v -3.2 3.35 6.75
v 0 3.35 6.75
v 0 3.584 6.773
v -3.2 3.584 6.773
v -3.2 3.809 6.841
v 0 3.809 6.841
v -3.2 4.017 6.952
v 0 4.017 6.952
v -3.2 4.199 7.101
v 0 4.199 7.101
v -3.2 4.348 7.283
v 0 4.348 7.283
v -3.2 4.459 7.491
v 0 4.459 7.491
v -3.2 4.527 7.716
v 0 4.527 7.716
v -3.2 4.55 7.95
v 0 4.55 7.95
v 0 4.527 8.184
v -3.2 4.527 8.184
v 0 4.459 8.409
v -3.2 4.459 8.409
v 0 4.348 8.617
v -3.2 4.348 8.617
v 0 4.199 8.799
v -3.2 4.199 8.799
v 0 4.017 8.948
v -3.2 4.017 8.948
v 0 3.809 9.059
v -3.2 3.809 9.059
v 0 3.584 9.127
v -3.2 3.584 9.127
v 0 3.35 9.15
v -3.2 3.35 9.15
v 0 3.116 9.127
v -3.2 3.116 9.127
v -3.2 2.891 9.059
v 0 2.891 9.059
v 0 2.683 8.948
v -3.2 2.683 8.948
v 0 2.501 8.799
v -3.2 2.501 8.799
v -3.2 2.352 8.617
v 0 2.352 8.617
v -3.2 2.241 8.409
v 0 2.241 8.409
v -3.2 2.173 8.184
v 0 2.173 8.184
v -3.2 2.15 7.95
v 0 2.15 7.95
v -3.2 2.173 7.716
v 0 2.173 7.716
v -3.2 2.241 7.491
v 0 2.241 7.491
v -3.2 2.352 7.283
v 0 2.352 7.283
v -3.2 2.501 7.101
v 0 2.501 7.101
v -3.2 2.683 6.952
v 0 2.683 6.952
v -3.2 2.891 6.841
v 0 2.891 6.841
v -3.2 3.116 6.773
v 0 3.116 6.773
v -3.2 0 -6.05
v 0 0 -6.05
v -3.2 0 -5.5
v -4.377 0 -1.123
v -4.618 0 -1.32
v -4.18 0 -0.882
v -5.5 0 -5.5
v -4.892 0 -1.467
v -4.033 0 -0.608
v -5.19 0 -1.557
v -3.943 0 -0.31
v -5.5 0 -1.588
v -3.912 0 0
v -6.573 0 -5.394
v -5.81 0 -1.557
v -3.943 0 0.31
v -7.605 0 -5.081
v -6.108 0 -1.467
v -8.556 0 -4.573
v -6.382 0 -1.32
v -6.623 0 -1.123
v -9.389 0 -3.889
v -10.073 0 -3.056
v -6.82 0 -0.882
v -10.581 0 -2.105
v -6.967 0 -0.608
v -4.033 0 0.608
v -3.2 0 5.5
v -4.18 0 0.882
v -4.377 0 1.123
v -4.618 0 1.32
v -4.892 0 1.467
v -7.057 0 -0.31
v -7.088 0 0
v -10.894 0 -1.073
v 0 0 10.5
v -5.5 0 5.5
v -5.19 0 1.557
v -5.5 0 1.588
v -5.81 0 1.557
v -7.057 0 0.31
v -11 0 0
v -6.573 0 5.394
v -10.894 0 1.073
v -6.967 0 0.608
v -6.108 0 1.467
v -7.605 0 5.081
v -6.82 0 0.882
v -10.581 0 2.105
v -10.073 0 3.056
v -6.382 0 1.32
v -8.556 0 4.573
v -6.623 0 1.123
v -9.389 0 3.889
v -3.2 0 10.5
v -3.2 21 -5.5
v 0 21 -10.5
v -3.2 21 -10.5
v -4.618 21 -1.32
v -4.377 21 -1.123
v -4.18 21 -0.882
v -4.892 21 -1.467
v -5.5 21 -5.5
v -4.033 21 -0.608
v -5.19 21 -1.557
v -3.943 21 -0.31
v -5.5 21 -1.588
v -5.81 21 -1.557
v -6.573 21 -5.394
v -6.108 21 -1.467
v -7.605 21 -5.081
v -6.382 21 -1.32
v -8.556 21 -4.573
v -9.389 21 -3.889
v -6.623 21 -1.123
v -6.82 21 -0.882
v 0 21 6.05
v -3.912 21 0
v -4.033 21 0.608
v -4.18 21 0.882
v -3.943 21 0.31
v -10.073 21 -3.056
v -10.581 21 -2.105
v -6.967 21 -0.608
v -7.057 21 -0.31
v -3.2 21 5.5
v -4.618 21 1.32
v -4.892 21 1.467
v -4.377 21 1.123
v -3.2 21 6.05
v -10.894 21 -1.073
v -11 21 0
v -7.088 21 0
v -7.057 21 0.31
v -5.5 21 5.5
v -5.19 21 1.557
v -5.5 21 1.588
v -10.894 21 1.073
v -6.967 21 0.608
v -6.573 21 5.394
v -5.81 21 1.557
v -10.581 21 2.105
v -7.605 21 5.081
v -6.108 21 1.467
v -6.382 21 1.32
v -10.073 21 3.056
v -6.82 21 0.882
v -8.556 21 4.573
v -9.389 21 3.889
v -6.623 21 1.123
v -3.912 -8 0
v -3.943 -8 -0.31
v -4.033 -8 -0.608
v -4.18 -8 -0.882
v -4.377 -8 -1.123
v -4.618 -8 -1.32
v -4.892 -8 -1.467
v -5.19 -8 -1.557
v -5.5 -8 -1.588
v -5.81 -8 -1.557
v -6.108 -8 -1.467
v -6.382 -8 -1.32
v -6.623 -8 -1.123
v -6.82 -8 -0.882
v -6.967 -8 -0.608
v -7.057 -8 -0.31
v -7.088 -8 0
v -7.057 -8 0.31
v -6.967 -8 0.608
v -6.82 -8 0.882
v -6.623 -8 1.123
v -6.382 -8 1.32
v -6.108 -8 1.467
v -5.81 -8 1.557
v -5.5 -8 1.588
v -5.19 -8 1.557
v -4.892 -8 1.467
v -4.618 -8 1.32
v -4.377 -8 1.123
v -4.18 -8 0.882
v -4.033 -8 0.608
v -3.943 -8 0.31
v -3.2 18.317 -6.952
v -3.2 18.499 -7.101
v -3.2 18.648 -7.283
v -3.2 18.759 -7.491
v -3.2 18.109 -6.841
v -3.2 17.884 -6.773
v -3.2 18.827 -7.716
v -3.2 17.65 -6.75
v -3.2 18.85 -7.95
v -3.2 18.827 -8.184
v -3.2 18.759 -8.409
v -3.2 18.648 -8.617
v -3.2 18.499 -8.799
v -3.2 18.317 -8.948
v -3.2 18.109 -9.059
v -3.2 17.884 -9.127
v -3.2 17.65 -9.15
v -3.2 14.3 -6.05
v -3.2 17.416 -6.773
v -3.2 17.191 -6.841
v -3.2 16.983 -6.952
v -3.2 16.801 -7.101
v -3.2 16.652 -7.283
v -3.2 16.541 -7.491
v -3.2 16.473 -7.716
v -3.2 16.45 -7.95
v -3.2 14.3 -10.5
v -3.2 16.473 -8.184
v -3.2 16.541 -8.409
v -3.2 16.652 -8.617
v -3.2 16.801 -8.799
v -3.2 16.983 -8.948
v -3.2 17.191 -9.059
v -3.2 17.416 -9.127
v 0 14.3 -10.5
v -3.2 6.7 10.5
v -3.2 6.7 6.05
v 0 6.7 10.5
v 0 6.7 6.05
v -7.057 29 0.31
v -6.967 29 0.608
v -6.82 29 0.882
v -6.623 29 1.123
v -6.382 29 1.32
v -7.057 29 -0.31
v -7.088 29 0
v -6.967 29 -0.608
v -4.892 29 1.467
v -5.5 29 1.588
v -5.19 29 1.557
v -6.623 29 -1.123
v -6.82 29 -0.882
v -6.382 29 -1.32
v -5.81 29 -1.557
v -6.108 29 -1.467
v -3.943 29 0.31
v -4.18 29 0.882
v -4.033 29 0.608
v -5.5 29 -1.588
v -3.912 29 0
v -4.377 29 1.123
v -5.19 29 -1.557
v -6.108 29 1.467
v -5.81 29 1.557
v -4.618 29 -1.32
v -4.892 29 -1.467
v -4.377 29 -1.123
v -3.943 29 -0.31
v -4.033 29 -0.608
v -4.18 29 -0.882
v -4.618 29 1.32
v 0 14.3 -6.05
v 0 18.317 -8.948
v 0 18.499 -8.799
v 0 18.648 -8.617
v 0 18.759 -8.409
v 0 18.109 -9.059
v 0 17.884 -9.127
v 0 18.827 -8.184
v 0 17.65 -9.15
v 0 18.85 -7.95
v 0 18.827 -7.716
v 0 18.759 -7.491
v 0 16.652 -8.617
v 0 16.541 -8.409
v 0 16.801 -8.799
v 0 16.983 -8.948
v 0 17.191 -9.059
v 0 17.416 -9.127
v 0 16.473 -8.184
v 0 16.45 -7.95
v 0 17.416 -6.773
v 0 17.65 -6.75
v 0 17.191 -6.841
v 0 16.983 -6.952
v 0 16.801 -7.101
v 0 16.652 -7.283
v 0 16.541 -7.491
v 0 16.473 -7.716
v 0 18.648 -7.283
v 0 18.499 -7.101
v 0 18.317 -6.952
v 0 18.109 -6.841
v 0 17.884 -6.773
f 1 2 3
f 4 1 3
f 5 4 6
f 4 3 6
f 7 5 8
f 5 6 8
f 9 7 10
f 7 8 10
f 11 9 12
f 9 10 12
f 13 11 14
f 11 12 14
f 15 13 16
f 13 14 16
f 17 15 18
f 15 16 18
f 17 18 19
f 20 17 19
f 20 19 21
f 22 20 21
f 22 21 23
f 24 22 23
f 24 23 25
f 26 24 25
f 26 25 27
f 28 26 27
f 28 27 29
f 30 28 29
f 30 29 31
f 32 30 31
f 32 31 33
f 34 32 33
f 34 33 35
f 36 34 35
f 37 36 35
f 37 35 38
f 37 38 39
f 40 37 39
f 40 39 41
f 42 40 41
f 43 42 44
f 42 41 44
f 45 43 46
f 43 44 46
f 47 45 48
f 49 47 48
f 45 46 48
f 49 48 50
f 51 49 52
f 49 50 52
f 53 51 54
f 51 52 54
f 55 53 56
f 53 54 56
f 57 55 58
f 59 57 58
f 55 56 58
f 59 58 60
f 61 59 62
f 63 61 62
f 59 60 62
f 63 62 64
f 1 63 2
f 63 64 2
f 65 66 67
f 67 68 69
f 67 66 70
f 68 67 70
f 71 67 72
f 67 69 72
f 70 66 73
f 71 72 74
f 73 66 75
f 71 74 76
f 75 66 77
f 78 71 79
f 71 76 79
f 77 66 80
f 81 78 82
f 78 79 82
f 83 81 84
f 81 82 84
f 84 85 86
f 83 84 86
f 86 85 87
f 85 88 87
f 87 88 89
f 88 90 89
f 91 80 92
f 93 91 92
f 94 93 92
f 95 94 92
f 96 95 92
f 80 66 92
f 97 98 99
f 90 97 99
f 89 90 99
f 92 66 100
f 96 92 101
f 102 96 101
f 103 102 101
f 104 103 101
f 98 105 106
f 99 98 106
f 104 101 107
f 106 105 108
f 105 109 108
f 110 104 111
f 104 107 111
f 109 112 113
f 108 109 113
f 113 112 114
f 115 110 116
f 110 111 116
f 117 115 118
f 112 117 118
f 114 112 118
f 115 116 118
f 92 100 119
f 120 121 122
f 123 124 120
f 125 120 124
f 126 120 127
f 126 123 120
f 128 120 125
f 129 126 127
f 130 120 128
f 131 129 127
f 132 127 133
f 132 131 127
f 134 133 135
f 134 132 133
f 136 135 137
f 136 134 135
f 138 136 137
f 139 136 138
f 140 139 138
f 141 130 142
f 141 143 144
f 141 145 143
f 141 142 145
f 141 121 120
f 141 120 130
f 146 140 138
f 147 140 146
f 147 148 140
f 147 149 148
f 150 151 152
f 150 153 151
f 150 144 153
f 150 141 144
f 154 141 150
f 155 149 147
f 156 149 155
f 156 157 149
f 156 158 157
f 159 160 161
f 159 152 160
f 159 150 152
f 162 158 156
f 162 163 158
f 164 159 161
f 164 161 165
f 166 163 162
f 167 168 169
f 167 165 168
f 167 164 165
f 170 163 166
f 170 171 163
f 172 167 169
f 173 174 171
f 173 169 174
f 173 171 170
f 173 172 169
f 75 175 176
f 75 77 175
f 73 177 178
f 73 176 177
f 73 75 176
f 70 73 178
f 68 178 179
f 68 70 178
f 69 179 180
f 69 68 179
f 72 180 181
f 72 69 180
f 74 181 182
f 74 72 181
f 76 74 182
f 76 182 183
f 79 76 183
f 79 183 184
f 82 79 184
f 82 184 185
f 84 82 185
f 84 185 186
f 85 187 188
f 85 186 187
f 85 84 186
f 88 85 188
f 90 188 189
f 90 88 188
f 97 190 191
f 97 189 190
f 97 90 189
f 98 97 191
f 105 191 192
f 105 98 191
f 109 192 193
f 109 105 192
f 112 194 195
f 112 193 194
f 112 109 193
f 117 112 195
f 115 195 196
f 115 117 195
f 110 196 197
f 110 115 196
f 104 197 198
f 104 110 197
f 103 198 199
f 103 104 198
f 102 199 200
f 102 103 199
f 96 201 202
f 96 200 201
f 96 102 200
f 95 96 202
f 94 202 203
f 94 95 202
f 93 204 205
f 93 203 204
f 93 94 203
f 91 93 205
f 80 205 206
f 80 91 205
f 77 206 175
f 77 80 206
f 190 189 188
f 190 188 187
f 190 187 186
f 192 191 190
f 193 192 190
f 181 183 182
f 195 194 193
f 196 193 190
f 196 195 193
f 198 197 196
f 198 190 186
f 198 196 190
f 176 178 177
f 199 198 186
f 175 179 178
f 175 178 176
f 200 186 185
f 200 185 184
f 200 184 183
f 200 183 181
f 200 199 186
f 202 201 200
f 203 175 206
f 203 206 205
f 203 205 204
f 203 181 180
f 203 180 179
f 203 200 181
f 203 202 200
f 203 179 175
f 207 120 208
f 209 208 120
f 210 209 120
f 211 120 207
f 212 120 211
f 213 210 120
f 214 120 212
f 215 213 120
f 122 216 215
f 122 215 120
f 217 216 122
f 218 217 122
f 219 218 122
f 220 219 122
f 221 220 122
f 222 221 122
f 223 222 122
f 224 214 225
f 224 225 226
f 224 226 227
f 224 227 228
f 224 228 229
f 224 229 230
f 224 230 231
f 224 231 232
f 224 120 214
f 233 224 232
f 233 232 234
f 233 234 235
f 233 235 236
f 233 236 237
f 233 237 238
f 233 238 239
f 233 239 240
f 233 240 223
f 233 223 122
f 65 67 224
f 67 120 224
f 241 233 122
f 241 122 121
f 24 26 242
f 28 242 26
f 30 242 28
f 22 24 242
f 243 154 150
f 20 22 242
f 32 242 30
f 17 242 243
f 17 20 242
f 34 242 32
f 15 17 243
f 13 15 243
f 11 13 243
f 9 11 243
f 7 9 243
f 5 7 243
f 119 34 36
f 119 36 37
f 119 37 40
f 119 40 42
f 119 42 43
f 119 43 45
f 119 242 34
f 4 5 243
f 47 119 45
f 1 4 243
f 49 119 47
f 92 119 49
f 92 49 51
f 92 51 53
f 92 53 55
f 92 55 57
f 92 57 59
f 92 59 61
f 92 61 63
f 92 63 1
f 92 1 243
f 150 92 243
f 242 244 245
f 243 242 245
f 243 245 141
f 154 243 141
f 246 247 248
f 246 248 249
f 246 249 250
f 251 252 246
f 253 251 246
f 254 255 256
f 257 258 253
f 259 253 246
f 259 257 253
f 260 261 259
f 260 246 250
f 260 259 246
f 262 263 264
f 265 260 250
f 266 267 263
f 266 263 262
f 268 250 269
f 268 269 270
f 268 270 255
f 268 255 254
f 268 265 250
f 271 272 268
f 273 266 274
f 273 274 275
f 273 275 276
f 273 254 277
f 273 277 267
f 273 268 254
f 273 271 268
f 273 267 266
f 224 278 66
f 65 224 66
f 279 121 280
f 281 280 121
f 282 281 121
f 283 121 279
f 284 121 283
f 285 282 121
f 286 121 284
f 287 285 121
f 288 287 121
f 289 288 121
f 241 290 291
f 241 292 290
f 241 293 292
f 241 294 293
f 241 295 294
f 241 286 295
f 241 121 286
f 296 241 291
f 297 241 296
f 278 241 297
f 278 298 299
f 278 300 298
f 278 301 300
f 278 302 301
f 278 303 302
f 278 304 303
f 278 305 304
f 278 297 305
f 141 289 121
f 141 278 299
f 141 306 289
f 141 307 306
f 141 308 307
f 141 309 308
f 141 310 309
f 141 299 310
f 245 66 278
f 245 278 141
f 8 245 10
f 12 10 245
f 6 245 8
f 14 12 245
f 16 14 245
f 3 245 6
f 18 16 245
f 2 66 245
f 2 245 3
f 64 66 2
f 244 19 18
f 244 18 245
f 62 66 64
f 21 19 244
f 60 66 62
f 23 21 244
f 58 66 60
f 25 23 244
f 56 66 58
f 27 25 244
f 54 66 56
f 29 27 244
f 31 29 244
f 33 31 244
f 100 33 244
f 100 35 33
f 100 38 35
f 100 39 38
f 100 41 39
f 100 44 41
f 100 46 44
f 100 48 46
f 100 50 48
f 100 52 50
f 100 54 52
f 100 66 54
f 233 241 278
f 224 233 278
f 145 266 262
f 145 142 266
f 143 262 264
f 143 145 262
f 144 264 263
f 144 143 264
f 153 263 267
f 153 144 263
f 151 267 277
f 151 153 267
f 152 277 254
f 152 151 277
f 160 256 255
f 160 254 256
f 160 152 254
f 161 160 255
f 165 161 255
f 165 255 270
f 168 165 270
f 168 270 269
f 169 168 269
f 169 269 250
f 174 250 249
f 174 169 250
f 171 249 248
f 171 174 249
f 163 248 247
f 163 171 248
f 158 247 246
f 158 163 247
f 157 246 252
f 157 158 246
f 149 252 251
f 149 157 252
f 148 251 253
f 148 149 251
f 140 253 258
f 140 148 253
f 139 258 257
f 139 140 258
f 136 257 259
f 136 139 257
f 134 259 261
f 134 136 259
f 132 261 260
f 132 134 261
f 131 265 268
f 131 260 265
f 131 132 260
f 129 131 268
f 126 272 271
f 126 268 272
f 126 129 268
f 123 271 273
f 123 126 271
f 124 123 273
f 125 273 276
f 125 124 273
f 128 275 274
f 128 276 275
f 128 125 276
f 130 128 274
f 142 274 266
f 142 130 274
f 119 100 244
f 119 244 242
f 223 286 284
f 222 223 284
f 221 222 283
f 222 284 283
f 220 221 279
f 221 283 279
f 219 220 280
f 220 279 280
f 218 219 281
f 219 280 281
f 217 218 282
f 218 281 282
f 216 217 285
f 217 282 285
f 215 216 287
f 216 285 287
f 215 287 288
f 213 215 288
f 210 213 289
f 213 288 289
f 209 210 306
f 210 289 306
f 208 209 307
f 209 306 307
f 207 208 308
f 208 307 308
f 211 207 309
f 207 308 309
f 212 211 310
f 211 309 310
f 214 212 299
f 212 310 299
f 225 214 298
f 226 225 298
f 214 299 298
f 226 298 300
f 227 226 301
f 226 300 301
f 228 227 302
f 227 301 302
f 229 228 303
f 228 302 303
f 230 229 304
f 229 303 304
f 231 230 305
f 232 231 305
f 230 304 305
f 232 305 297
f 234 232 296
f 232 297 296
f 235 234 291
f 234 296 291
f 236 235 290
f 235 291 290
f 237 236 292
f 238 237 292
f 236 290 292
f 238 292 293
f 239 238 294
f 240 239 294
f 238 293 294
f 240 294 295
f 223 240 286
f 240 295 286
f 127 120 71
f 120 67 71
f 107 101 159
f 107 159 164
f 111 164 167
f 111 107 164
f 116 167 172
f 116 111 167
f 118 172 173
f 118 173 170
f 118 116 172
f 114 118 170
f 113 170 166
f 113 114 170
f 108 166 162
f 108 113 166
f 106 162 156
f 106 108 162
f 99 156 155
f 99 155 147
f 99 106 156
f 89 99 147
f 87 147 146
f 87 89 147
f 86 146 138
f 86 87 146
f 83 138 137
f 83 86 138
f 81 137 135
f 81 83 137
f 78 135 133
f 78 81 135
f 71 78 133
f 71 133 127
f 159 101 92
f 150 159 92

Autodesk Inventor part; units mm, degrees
ref_plane "YZ Plane" through (0, 0, 0) normal (1, 0, 0) x (0, 1, 0)
ref_plane "XZ Plane" through (0, 0, 0) normal (0, 1, 0) x (-1, 0, 0)
ref_plane "XY Plane" through (0, 0, 0) normal (0, 0, 1) x (1, 0, 0)
sketch "Sketch1" plane through (0, 0, 0) normal (0, 1, 0) x (-1, 0, 0)
  arc A0 (5.5, -5.5) -> (11, 0) centre (5.5, 0) ccw
  line L0 (3.2, -5.5) -> (3.2, -10.5)
  line L1 (3.2, -10.5) -> (0, -10.5)
  line L2 (0, -10.5) -> (0, 10.5)
  line L3 (0, 10.5) -> (3.2, 10.5)
  line L4 (3.2, 10.5) -> (3.2, 5.5)
  arc A1 (11, 0) -> (5.5, 5.5) centre (5.5, 0) ccw
  line L5 (3.2, 5.5) -> (11, 0) construction
  line L6 (3.2, -5.5) -> (11, 0) construction
  line L7 (5.5, 5.5) -> (3.2, 5.5)
  line L8 (3.2, -5.5) -> (5.5, -5.5)
  point P0 (0, 0)
  point P1 (0, 0)
  dimension "d0" = 3.2
  dimension "d1" = 21
  dimension "d6" = 11
  dimension "d21" = 11
extrude "Extrusion1" add sketch "Sketch1" along normal blind 21
sketch "Sketch2" plane through (0, 0, 10.5) normal (1, 0, 0) x (0, 0, -1)
  circle A0 centre (18.45, 17.65) radius 1.2
  circle A1 centre (2.55, 3.35) radius 1.2
  line L0 (18.45, 17.65) -> (18.45, 3.35) construction
  line L1 (18.45, 3.35) -> (2.55, 3.35) construction
  line L2 (21, 0) -> (21, 21) projected
  line L3 (0, 0) -> (0, 21) projected
  line L4 (18.45, 17.65) -> (21, 17.65) construction
  line L5 (18.45, 17.65) -> (21, 21) construction
  line L6 (0, 0) -> (2.55, 3.35) construction
  line L7 (2.55, 3.35) -> (0, 3.35) construction
  line L8 (21, 14.3) -> (16.55, 14.3)
  line L9 (16.55, 14.3) -> (16.55, 0)
  line L10 (16.55, 0) -> (21, 0)
  line L11 (0, 6.7) -> (4.45, 6.7)
  line L12 (4.45, 6.7) -> (4.45, 21)
  line L13 (4.45, 21) -> (0, 21)
  line L14 (21, 14.3) -> (18.45, 17.65) construction
  point P0 (10.5, 0)
  dimension "d9" = 15.9
  dimension "d10" = 14.3
  dimension "d11" = 2.4
  dimension "d12" = 1.9
extrude "Extrusion2" cut sketch "Sketch2" against normal up to surface (3.2 mm away)
sketch "Sketch3" plane through (0, 0, 0) normal (0, -1, 0) x (1, 0, 0)
  arc A0 (-3.2, 5.5) -> (-3.2, -5.5) centre (-5.5, 0) ccw projected
  circle A1 centre (-5.5, 0) radius 1.5875
  point P0 (0, 0)
  dimension "d15" = 3.175
extrude "Extrusion3" add sketch "Sketch3" along normal blind 8
sketch "Sketch4" plane through (0, 21, 0) normal (0, 1, 0) x (1, 0, 0)
  arc A0 (-3.2, 5.5) -> (-3.2, -5.5) centre (-5.5, 0) ccw construction
  circle A1 centre (-5.5, 0) radius 1.5875
  point P0 (0, 0)
  dimension "d18" = 3.175
extrude "Extrusion4" add sketch "Sketch4" along normal blind 8
properties part number "Power Resistor - HSA25" material "Gold"
